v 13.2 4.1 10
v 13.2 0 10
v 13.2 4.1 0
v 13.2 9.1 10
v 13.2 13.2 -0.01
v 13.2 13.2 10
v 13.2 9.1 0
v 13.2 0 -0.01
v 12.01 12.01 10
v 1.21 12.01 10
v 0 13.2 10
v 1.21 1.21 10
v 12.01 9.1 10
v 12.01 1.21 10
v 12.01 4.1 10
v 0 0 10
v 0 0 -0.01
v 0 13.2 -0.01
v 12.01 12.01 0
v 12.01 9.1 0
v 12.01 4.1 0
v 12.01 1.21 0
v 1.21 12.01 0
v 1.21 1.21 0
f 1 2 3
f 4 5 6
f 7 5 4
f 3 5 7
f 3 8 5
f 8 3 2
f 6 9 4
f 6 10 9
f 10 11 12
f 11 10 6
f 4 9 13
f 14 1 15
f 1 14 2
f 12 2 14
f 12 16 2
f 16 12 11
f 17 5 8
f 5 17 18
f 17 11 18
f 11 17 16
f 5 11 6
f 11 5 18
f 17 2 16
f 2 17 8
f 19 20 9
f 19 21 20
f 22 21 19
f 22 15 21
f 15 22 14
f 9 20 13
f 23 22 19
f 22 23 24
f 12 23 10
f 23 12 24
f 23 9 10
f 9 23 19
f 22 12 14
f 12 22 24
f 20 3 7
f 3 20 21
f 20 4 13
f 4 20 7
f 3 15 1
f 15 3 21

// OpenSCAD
// file: ../../Base/Rotation.scad
// Fischertechnik Box Foundation
// Geometry Helpers Rotation

include <PlacementOptions.scad>

// getRotatedSpace(space, rotation=NoRotation)
// Rotates the space dependent on the specified rotation

function getRotatedSpace(space, rotation=NoRotation) = [
    (rotation == Rotate90 || rotation == Rotate270) ? space.y : space.x,
    (rotation == Rotate90 || rotation == Rotate270) ? space.x : space.y
];

// Rotates the given space around the fixed left lower corner
// space = the space the children needs as width/depth list [width,depth]
// rotation = 0 Rotate0 degrees, 1 Rotate90 degrees, 2 Rotate180 degrees, 3 Rotate270 degrees (equivalent to -90)

module RotateFix(space, rotation=NoRotation) {
    dy = (rotation == Rotate0 || rotation == Rotate270) ? 0 :
        (rotation == Rotate90) ? space.x :
        space.y;
    dx = (rotation < Rotate180) ? 0 :
        (rotation == Rotate180) ? space.x :
        space.y;
    
    translate([dx, dy, 0])
        rotate([0, 0, rotations[rotation]])
            children();
}
// file: ../../Base/Alignment.scad
// Fischertechnik Box Foundation
// Geometry Helpers Alignment

include <PlacementOptions.scad>

// getAlignedX(elementWidth, spaceWidth, align=AlignRight, offset=0)
// Gets the aligned X offset of an element with the given
// width in the given space.
// elementWidth = The width of the element to positon
// spaceWidth = The space where the element should be aligned
// align = 0 AlignLeft, 1 AlignCenter, 2 AlignRight
// offset = an optional offset from the aligned position. When
// aligned left or centered, then positive values are in X direction.
// When aligned right then positive values are in negative X direction.

function getAlignedX(elementWidth, spaceWidth, align=AlignRight, offset=0) =
    (align == AlignLeft) ?
        offset :
        ((align == AlignCenter) ?
        (spaceWidth - elementWidth)/2 + offset :
        spaceWidth - offset - elementWidth);

// getAlignedY(elementDepth, spaceDepth, align=AlignTop, offset=0)
// Gets the aligned Y offset of an element with the given
// depth in the given space.
// elementDepth = The depth of the element to positon
// spaceDepth = The space where the element should be aligned
// align = 0 AlignBottom, 1 AlignCenter, 2 AlignTop
// offset = an optional offset from the aligned position. When
// aligned bottom or centered, then positive values are in Y direction.
// When aligned top then positive values are in negative Y direction.

function getAlignedY(elementDepth, spaceDepth, align=AlignTop, offset=0) =
    (align == AlignBottom) ?
        offset :
        ((align == AlignCenter) ?
        (spaceDepth - elementDepth)/2 + offset :
        spaceDepth - offset - elementDepth);
// file: ../../Base/PlacementOptions.scad
// Fischertechnik Box Foundation
// Placement Options

// Alignment
NoAlign = 0;
AlignLeft = 1;
AlignBottom = 2;
AlignCenter = 3;
AlignRight = 4;
AlignTop = 5;

// Element rotation degree steps
rotations = [0, -90, -180, -270];

// Rotation
NoRotation = 0;
Rotate0 = 0;
Rotate90 = 1;
Rotate180 = 2;
Rotate270 = 3;

// Docking (seen from above)
NoDock = -1;
DockLeft = 0;
DockTop = 1;
DockRight = 2;
DockCorner = 2;
DockBottom = 3;

// Web corners
LowerLeft = 0;
UpperLeft = 1;
UpperRight = 2;
LowerRight = 3;

// Web position relative to corner
LeftOfCorner = 0;
RightOfCorner = 1;
// file: ../../Base/Boxes.scad
// Fischertechnik Box Foundation
// Pre-designed Boxes

use <Constants.scad>

include <PlacementOptions.scad>

box190Width = 190;
box190Depth = 130;
box130Width = 130;
box130Depth = 95;

// Values are from an original ec3 box
topBottomDifference = 1.5;
outerHeight = 40;
baseThickness = 1.8;
innerHeight = outerHeight - baseThickness;
stackExcess = 5.7;
radius = 3.5;
wallThickness = 1.5;
tolerance = 0.2;

boxWallThickness = wallThickness;
boxBaseThickness = baseThickness;
boxWebWidth = 3.0;

// getBoxWallThickness()
// Gets the wall thickness of a Fischertechnik Box
function getBoxWallThickness() = boxWallThickness;

// getBoxUsageHeight(height = 38.2)
// Gets the usable height of a Fischertechnik box
// height = Outer height of the box from the bottom to the upper edge.
function getBoxUsageHeight(height = outerHeight) = height - baseThickness - stackExcess;

// getBoxInnerHeight()
// Gets the inner height of a Fischertechnik box, including the stack excess
function getBoxInnerHeight() = innerHeight;

// getBoxBaseThickness()
// Gets the thickness of the Fischertechnik box base.
function getBoxBaseThickness() = boxBaseThickness;

// getBoxWebWidth()
// Gets the width of a box web
function getBoxWebWidth() = boxWebWidth;

// getBox190Space()
// Gets the usable inner space of a Box 190 as an x/y-list
function getBox190Space() = [
    box190Width - 2*getBoxWallThickness() - topBottomDifference, 
    box190Depth - 2*getBoxWallThickness() - topBottomDifference ];

// RoundedCornerPlate(width, depth, height, radius)
// Creates a body plate with rounded corners for a box. Used
// also to create the complete box with the hull module.
// width = Width of the plate
// depth = depth of the plate 
// height = thickness of the plate
// radius = radius of the rounded corner
module RoundedCornerPlate(width, depth, height, radius) {
    translate([radius, radius])
    hull() {
        w = width-2*radius;
        d = depth-2*radius;
        cube([w, d, height]);
        cylinder(height, r=radius, $fn=getFragments());
        translate([w, 0])
            cylinder(height, r=radius, $fn=getFragments());
        translate([w, d])
            cylinder(height, r=radius, $fn=getFragments());
        translate([0, d])
            cylinder(height, r=radius, $fn=getFragments());
    }
}

// BoxBase(width, depth)
// Creates an empty stackable Fischertechnik compatible box
// width = Outer width of the box (190, 130, ...)
// depth = Outer depth of the box (130, 95, ...)

module BoxBase(width, depth, height=outerHeight) {    
    thinPlate = 0.01;

    innerHeight = height - baseThickness;    
    
    module Body(tolerance=tolerance) {
        hull() {
            // Bottom with tolerance to fit into the original boxes when stacked
            translate([-wallThickness+tolerance, -wallThickness+tolerance, -baseThickness])
                RoundedCornerPlate(width-topBottomDifference-2*tolerance, depth-topBottomDifference-2*tolerance, thinPlate, radius);
            
            // Top
            translate([-wallThickness-topBottomDifference/2, -wallThickness-topBottomDifference/2, innerHeight-thinPlate])
                RoundedCornerPlate(width, depth, thinPlate, radius);
         }
    }

    module Cutoff() {
        hull() {
            coWidth = width - 2*wallThickness;
            coDepth = depth - 2*wallThickness;
            
            // Bottom
            RoundedCornerPlate(coWidth-topBottomDifference, coDepth-topBottomDifference, thinPlate, radius);

            // Top
            translate([-topBottomDifference/2, -topBottomDifference/2, innerHeight+thinPlate]) 
                RoundedCornerPlate(coWidth, coDepth, thinPlate, radius);
        }
    }
    
    difference() {        
        Body();
        Cutoff();
        stackOffset = innerHeight - stackExcess;
        translate([0, 0, stackOffset + baseThickness])
            Body(tolerance=0);
    }
}

// Creates the Fischertechnik empty box 130x190 mm and places it at position 0,0
// 190x130 are the outer sizes, the inner space is slightly smaller. Use getBox190Space() to get the inner sizes.
// The box is positioned that the usable inner space is at the 0,0,0 position.

module Box190() {
    BoxBase(box190Width, box190Depth);
}

// Gets the usable inner space of a Box 130 as an x/y-list
function getBox130Space() = [
    box130Width - 2*getBoxWallThickness() - topBottomDifference, 
    box130Depth - 2*getBoxWallThickness() - topBottomDifference ];

// Creates the Fischertechnik empty box 95x130 mm and places it at position 0,0
// 190x130 are the outer sizes, the inner space is slightly smaller. Use getBox190Space() to get the inner sizes.
// The box is positioned that the usable inner space is at the 0,0,0 position.

module Box130() {
    BoxBase(box130Width, box130Depth);
}

// Creates a web at the specified box walls
// corner 0 = LowerLeft, 1 = UpperLeft, 2 = UpperRight, 3 = LowerRight
// side 0 = LeftOfCorner, 1 = RightOfCorner
// distance = Distance in mm from the corner
// boxSpace = inner width and depth of the box (default: Box 190)
// webWidth = length of the web (default is 3 mms)
// webThickness = thickness of the web (default is 1 mm)
// height = Height of the web (standard is getBoxUsageHeight())
// sink = How much of the web is sunk into the wall

module BoxWeb(
    corner, 
    side, 
    distance, 
    boxSpace=getBox190Space(), 
    webWidth=getBoxWebWidth(), 
    webThickness=1.0, 
    height=getBoxUsageHeight(),
    sink = getBoxWallThickness()/2) {
    width = (corner % 2 == 0) ? 
            (side == LeftOfCorner ? webWidth : webThickness) :
            (side == LeftOfCorner ? webThickness : webWidth);

    depth = (corner % 2 == 0) ? 
            (side == RightOfCorner ? webWidth : webThickness) :
            (side == RightOfCorner ? webThickness : webWidth);
    
    xDiff = corner == LowerLeft ? 
                (side == LeftOfCorner ? -sink : distance) :
            (corner == UpperLeft ?                
                (side == LeftOfCorner ? distance : -sink) :
            (corner == UpperRight ?
                (side == LeftOfCorner ? boxSpace.x-webWidth+sink : boxSpace.x-distance-webThickness) :
                (side == LeftOfCorner ? boxSpace.x-distance-webThickness: boxSpace.x-webWidth+sink)));

    yDiff = corner == LowerLeft ? 
                (side == RightOfCorner ? -sink : distance) :
            (corner == UpperLeft ?
                (side == RightOfCorner ? boxSpace.y-distance-webThickness : boxSpace.y-webWidth+sink) :
            (corner == UpperRight ?
                (side == RightOfCorner ? boxSpace.y-webWidth+sink : boxSpace.y-distance-webThickness) :
                (side == RightOfCorner ? distance : -sink)));
    
    translate([xDiff, yDiff, -getExcess()])
        cube([width, depth, height + 2*getExcess()]);
}
// file: ../../Base/Placement.scad
// Fischertechnik Box Foundation
// Geometry Helpers Placement

use <Constants.scad>
use <Alignment.scad>
use <Rotation.scad>
use <Boxes.scad>

include <PlacementOptions.scad>

// Place(x=0, y=0, elementSpace=[0,0], alignX=AlignLeft, alignY=AlignBottom, rotation=Rotate0, boxSpace=getBox190Space())
// Places the child at the specified position
// y = Y-Position. This is a relative position when an X aligment is specified.
// x = X-Position. This is a relative position when an Y aligment is specified.
// elementSpace = space of the element to be placed [x,y]
// alignX = -1=NoAlign, 0 AlignLeft, 1 AlignCenter, 3 AlignRight (elementSpace and boxSpace required!)
// alignY = -1=NoAlign, 2 AlignBottom, 1 AlignCenter, 4 AlignTop (elementSpace and boxSpace required!)
// rotation = 0 Rotate0 0 degrees, 1 Rotate90 90 degrees, 
// 2 Rotate180 180 degrees, 3 Rotate270 270 degrees (equivalent to -90)
// boxSpace = Inner space of the box where the placement occurs [x,y] - default is Box 190x130 inner space

module Place(x=0, y=0, elementSpace=[0,0], 
  alignX=AlignLeft, alignY=AlignBottom, 
  rotation=NoRotation, boxSpace=getBox190Space()) {

    module Position(x, y, space, rotation=Rotate0) {
        translate([x, y, 0])
            RotateFix(space, rotation)
                children();
    }

    space = getRotatedSpace(elementSpace, rotation);
    alignedX = getAlignedX(space.x, boxSpace.x, alignX, x);
    alignedY = getAlignedY(space.y, boxSpace.y, alignY, y);
    Position(alignedX, alignedY, elementSpace, rotation)
        children();
}

// Center(space=getBox130Space(), elementSpace=[0,0])
// space = Space where the children is centered. For cylinder use centered=true and no elementSpace.
// elementSpace = space of the element to be centered [x,y]

module Center(space=getBox190Space(), elementSpace=[0,0]) {
    Place(elementSpace=elementSpace, boxSpace=space, alignX=AlignCenter, alignY=AlignCenter)
        children();
}

// CenterHorizontal(width=0, y=0, offset=0, space=getBox130Space())
// width = Width of the element to be placed.
// y = Y position of the element
// offset = Offset from the center position (negative will be left of the center)
// space = Space where the element is placed

module CenterHorizontal(width=0, y=0, offset=0, space=getBox190Space()) {
    Place(x=offset, y=y, elementSpace=[width, 0], boxSpace=space, alignX=AlignCenter)
        children(0);
}

// CenterVertical(depth=0, x=0, offset=0, space=getBox130Space())
// depth = Depth of the element to be placed.
// x = X position of the element
// offset = Offset from the center position (negative will be down of the center)
// space = Space where the element is placed

module CenterVertical(depth=0, x=0, offset=0, space=getBox190Space()) {
    Place(x=x, y=offset, elementSpace=[0, depth], boxSpace=space, alignY=AlignCenter)
        children(0);
}

// getIsVertical(align)
// True if the specified alignment needs a vertical orientation for a divider (AlignRight, AlignLeft)

function getIsVertical(align) = (align == AlignRight || align == AlignLeft);

// getIsHorizontal(align)
// True if the specified alignment needs a horizontal orientation for a divider (AlignTop, AlignBottom)

function getIsHorizontal(align) = (align == AlignTop || align == AlignBottom);
// file: ../../Base/Constants.scad
// Fischertechnik Box Foundation
// Constants

// Constant values necessary for multiple elements

// Base constants
dividerThickness = 1.2;
excess = 0.01;
fragments = 90;
tolerance = 0.8;

// Gets the thickness of a divider 
function getDividerThickness() = dividerThickness;

// Gets the excess that is used to merge walls into each other
function getExcess() = excess;

// Gets amount of fragments of a cylinder
function getFragments() = fragments;

// Gets the inner tolerance of a frame to each side
function getTolerance() = tolerance;


// Fischertechnik specific constants
axisDiameter = 4;
axisBottomDiameter = axisDiameter + 1;
axisTolerance = 0.2;

// Gets axis diameter of Fischertechnik axis
function getAxisDiameter() = axisDiameter;

// Gets axis diameter tolerance (subtracted for element axis)
function getAxisTolerance() = axisTolerance;

// Gets the axis diameter for standing axis
function getStandAxisDiameter() = getAxisDiameter() - getAxisTolerance();

// Gets axis bottom diameter for thicker part at the bottom
function getAxisBottomDiameter() = axisBottomDiameter;

pinHeight = 2.5;

// gets the height of a connecting pin
function getPinHeight() = pinHeight;

standardEdgeDistance = 2.5;
standardWebDistance = 11.5;
standardCornerLength = 15;

// gets the standard distance to the wall of the box for dockable frames with webs
function getStandardEdgeDistance() = standardEdgeDistance;

// gets the standard distance of each web to the corner of the dockable frame
function getStandardWebDistance() = standardWebDistance;

// gets the standard length of the corner walls of a dockable frame
function getStandardCornerLength() = standardCornerLength;

tubeWallFactor = 0.8;

// gets the wall thickness of a tube.
function getTubeWallThickness() = tubeWallFactor * getDividerThickness();

smallPartsFrameHeight = 20;

// gets the frame height for docked small parts boxes.
function getSmallPartsFrameHeight() = smallPartsFrameHeight;

hubRingDiameter = 19.5;
hubRingLevelDiameter = 21;

// gets the diameter of a tube matching the inner ring of a wheel
function getHubRingDiameter() = hubRingDiameter;

// gets the diameter of a hub tube with a thicker diameter
function getHubRingLevelDiameter() = hubRingLevelDiameter;
// main file
// Fischertechnik Box Foundation
// ModelBase
// Test FrameRightCutoff

use <../../Base/Constants.scad>
use <../../ModelBase/Simple.scad>

cutoffWidth = 5;
offset = 0;

difference() {
    Frame([10,10,10]);
    FrameRightCutoff([10,10,10], cutoffWidth, offset);
}
